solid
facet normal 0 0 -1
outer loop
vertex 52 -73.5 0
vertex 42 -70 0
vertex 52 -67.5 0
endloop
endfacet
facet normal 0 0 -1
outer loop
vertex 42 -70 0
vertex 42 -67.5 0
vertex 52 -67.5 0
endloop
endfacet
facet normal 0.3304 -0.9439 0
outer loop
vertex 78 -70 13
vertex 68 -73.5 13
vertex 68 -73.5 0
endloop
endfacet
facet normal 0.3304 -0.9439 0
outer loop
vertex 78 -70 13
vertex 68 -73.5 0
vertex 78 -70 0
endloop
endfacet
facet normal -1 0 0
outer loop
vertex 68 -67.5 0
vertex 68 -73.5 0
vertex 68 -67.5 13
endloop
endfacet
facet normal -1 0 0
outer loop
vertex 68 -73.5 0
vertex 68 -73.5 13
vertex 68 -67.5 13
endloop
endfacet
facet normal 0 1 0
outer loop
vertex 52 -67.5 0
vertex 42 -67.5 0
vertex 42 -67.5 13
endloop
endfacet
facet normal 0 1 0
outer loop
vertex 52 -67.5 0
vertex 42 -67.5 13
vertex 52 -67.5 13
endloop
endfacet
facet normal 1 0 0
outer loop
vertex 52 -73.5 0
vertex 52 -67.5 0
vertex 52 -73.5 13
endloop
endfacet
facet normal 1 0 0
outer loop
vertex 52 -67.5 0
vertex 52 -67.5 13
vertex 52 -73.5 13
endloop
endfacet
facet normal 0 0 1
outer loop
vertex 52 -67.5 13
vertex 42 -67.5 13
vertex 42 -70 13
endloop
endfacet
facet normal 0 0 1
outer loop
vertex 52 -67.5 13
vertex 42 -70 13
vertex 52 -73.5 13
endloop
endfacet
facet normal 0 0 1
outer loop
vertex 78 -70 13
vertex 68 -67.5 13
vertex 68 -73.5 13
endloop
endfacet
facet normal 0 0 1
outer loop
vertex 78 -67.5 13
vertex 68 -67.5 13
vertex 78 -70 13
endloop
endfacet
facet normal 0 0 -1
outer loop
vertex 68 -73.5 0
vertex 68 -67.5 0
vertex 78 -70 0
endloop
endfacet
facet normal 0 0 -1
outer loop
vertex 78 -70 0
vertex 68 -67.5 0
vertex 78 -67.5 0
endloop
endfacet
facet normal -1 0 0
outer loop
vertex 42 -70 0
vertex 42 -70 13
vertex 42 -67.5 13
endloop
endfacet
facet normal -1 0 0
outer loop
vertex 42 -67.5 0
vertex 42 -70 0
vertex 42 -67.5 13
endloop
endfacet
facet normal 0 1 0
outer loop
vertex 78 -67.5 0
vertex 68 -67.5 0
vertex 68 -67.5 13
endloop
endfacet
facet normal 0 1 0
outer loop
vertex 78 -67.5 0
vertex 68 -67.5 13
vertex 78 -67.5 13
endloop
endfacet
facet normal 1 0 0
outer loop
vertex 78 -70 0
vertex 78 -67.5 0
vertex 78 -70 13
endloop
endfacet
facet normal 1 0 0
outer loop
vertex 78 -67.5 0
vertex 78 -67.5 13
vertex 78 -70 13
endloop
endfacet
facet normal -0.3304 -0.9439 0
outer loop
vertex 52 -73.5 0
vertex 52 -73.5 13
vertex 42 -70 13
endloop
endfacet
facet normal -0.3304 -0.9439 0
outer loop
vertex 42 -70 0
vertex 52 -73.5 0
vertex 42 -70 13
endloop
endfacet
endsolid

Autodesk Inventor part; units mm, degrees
ref_plane "YZ Plane" through (0, 0, 0) normal (1, 0, 0) x (0, 1, 0)
ref_plane "XZ Plane" through (0, 0, 0) normal (0, 1, 0) x (-1, 0, 0)
ref_plane "XY Plane" through (0, 0, 0) normal (0, 0, 1) x (1, 0, 0)
sketch "Szkic1" plane through (78, -70, 13) normal (0, 0, 1) x (1, 0, 0)
  line L0 (-10, 0) -> (-10, -3.5)
  line L1 (-10, -3.5) -> (0, 0)
  line L2 (-10, 0) -> (-10, 2.5)
  line L3 (-10, 2.5) -> (0, 2.5)
  line L4 (0, 2.5) -> (0, 0)
  line L5 (-36, 0) -> (-36, 2.5)
  line L6 (-36, 2.5) -> (-26, 2.5)
  line L7 (-26, 2.5) -> (-26, -3.5)
  line L8 (-26, -3.5) -> (-36, 0)
  point P0 (-78, 70)
  dimension "d0" = 10
  dimension "d1" = 3.5
  dimension "d4" = 2.5
  dimension "d5" = 36
  dimension "d6" = 10
  dimension "d7" = 10
extrude "Wyciągnięcie proste1" add sketch "Szkic1" against normal blind 13
properties part number "N20"
